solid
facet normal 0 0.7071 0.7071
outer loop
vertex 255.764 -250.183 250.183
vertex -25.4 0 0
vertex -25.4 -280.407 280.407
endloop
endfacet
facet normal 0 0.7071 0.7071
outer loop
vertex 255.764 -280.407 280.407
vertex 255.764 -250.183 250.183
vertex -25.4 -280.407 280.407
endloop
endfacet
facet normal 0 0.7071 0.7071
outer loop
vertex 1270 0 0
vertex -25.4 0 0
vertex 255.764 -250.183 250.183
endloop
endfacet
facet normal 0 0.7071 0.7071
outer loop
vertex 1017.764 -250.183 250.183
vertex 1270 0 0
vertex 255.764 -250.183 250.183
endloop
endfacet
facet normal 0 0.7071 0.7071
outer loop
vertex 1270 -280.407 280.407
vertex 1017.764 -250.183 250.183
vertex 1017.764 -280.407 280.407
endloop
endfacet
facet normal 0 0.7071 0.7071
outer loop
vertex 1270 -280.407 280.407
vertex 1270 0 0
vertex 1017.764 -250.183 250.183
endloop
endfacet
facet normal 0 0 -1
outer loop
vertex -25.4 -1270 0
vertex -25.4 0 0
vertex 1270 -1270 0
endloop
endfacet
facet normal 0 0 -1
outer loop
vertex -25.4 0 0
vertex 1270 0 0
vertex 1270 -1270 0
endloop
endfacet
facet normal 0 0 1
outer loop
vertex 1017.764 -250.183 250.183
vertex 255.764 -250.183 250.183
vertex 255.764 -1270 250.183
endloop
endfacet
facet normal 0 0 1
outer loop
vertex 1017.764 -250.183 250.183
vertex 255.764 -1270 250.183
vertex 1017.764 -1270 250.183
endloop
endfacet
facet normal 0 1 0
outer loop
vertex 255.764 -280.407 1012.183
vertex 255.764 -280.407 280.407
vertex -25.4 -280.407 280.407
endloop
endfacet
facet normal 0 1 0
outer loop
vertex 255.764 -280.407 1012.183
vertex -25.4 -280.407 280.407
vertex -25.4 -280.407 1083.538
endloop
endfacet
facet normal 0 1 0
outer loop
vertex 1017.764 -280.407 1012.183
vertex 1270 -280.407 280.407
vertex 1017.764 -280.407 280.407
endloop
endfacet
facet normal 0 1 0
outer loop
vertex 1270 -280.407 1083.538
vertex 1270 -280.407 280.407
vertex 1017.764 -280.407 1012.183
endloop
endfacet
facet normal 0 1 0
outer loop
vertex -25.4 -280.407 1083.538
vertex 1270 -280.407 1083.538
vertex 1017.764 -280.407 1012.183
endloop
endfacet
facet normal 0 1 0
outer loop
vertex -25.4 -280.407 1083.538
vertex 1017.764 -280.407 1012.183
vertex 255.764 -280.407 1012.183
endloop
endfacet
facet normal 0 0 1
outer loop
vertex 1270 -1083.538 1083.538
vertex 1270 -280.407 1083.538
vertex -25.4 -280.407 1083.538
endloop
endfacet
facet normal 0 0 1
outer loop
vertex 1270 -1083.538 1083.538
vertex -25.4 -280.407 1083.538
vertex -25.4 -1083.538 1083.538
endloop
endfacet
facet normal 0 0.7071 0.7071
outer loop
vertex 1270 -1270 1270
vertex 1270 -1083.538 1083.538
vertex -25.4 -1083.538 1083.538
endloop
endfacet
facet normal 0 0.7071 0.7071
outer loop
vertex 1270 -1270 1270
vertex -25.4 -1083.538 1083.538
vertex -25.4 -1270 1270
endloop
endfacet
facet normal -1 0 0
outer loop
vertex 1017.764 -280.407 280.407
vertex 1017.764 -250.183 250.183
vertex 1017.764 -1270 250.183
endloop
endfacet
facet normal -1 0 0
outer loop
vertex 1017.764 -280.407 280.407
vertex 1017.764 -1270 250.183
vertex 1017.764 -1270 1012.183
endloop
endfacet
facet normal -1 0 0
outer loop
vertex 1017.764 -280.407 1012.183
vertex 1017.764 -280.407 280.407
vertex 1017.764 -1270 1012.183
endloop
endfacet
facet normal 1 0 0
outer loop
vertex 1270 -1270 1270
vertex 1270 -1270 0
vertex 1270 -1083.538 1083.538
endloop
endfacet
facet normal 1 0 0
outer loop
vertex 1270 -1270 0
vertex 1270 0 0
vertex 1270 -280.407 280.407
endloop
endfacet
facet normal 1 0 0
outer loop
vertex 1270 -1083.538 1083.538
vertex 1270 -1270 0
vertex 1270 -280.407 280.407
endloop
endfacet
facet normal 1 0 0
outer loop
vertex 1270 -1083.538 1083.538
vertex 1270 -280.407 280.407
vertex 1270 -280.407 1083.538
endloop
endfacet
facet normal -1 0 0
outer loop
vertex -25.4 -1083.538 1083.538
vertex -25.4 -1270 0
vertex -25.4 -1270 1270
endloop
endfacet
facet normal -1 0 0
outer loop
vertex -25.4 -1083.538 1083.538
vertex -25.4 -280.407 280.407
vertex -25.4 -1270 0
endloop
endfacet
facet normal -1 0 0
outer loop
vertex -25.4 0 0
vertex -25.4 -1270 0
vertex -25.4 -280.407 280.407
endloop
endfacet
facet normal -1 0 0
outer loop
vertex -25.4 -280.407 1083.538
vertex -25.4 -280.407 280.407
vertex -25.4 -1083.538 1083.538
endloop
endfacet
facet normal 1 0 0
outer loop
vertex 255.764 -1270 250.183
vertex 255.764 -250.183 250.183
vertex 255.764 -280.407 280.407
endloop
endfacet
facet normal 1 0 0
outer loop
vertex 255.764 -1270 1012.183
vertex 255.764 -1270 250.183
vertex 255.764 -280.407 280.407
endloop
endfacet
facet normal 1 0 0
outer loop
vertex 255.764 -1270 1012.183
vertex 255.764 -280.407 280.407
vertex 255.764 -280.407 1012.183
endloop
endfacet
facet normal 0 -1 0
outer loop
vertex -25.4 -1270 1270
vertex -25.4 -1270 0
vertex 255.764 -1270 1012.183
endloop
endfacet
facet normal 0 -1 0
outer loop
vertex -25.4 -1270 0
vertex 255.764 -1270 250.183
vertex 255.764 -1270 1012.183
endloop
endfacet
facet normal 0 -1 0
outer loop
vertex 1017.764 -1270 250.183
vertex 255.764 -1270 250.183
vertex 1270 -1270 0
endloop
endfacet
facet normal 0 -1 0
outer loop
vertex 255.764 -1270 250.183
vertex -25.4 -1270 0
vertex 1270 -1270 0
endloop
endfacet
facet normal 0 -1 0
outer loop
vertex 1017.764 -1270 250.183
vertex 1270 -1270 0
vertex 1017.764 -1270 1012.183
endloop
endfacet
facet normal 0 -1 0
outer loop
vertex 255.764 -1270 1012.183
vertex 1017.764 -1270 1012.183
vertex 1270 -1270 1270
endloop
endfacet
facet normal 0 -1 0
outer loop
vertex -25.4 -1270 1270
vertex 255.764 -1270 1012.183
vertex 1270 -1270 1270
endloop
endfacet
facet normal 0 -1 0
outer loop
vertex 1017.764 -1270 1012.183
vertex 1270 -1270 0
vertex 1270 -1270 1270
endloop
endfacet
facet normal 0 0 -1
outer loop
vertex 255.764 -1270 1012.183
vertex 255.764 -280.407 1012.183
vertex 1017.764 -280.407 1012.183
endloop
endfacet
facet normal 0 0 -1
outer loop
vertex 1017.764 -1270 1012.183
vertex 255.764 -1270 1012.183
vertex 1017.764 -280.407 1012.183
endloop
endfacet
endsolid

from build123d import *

# Parameters (mm, degrees)
F0_W     = 1270
F0_H     = 1270
F0_W_2   = 762
F0_H_2   = 762
F1_DEPTH = 1270
F3_W     = 762
F3_H     = 762
F4_DEPTH = 12.7
F5_DEPTH = 1270.001
F6_DEPTH = 25.4


with BuildPart() as f1:
    # F0 (on Front) → F1 (new body)
    with BuildSketch(Plane.XZ):
        with Locations((635, 635)):
            Rectangle(F0_W, F0_H)
        with Locations((636.763900746, 631.1829624176)):
            Rectangle(F0_W_2, F0_H_2, mode=Mode.SUBTRACT)
    extrude(amount=F1_DEPTH)

    # F3 (on face) → F4 (cut, symmetric)
    with BuildSketch(Plane.XY.offset(1270)):
        with Locations((615.9371882677, -549.7496393476)):
            Rectangle(F3_W, F3_H)
    extrude(amount=F4_DEPTH, both=True, mode=Mode.SUBTRACT)

    # F2 (on face) → F5 (cut, through all)
    with BuildSketch(Plane.YZ.offset(1270)):
        Polygon((0, 1270), (-1270, 1270), (-1083.5376977921, 1083.5376977921), (-280.4070115089, 1083.5376977921), (-280.4070115089, 280.4070115089), (0, 0), align=None)
    extrude(amount=-F5_DEPTH, mode=Mode.SUBTRACT)

    # F6 (add): a face of the model
    f6_faces = [f1.faces().sort_by_distance(p)[0] for p in [
        (0, -761.3801568412, 535.4569952832),
    ]]
    extrude(f6_faces, amount=F6_DEPTH)


solid = f1.part
